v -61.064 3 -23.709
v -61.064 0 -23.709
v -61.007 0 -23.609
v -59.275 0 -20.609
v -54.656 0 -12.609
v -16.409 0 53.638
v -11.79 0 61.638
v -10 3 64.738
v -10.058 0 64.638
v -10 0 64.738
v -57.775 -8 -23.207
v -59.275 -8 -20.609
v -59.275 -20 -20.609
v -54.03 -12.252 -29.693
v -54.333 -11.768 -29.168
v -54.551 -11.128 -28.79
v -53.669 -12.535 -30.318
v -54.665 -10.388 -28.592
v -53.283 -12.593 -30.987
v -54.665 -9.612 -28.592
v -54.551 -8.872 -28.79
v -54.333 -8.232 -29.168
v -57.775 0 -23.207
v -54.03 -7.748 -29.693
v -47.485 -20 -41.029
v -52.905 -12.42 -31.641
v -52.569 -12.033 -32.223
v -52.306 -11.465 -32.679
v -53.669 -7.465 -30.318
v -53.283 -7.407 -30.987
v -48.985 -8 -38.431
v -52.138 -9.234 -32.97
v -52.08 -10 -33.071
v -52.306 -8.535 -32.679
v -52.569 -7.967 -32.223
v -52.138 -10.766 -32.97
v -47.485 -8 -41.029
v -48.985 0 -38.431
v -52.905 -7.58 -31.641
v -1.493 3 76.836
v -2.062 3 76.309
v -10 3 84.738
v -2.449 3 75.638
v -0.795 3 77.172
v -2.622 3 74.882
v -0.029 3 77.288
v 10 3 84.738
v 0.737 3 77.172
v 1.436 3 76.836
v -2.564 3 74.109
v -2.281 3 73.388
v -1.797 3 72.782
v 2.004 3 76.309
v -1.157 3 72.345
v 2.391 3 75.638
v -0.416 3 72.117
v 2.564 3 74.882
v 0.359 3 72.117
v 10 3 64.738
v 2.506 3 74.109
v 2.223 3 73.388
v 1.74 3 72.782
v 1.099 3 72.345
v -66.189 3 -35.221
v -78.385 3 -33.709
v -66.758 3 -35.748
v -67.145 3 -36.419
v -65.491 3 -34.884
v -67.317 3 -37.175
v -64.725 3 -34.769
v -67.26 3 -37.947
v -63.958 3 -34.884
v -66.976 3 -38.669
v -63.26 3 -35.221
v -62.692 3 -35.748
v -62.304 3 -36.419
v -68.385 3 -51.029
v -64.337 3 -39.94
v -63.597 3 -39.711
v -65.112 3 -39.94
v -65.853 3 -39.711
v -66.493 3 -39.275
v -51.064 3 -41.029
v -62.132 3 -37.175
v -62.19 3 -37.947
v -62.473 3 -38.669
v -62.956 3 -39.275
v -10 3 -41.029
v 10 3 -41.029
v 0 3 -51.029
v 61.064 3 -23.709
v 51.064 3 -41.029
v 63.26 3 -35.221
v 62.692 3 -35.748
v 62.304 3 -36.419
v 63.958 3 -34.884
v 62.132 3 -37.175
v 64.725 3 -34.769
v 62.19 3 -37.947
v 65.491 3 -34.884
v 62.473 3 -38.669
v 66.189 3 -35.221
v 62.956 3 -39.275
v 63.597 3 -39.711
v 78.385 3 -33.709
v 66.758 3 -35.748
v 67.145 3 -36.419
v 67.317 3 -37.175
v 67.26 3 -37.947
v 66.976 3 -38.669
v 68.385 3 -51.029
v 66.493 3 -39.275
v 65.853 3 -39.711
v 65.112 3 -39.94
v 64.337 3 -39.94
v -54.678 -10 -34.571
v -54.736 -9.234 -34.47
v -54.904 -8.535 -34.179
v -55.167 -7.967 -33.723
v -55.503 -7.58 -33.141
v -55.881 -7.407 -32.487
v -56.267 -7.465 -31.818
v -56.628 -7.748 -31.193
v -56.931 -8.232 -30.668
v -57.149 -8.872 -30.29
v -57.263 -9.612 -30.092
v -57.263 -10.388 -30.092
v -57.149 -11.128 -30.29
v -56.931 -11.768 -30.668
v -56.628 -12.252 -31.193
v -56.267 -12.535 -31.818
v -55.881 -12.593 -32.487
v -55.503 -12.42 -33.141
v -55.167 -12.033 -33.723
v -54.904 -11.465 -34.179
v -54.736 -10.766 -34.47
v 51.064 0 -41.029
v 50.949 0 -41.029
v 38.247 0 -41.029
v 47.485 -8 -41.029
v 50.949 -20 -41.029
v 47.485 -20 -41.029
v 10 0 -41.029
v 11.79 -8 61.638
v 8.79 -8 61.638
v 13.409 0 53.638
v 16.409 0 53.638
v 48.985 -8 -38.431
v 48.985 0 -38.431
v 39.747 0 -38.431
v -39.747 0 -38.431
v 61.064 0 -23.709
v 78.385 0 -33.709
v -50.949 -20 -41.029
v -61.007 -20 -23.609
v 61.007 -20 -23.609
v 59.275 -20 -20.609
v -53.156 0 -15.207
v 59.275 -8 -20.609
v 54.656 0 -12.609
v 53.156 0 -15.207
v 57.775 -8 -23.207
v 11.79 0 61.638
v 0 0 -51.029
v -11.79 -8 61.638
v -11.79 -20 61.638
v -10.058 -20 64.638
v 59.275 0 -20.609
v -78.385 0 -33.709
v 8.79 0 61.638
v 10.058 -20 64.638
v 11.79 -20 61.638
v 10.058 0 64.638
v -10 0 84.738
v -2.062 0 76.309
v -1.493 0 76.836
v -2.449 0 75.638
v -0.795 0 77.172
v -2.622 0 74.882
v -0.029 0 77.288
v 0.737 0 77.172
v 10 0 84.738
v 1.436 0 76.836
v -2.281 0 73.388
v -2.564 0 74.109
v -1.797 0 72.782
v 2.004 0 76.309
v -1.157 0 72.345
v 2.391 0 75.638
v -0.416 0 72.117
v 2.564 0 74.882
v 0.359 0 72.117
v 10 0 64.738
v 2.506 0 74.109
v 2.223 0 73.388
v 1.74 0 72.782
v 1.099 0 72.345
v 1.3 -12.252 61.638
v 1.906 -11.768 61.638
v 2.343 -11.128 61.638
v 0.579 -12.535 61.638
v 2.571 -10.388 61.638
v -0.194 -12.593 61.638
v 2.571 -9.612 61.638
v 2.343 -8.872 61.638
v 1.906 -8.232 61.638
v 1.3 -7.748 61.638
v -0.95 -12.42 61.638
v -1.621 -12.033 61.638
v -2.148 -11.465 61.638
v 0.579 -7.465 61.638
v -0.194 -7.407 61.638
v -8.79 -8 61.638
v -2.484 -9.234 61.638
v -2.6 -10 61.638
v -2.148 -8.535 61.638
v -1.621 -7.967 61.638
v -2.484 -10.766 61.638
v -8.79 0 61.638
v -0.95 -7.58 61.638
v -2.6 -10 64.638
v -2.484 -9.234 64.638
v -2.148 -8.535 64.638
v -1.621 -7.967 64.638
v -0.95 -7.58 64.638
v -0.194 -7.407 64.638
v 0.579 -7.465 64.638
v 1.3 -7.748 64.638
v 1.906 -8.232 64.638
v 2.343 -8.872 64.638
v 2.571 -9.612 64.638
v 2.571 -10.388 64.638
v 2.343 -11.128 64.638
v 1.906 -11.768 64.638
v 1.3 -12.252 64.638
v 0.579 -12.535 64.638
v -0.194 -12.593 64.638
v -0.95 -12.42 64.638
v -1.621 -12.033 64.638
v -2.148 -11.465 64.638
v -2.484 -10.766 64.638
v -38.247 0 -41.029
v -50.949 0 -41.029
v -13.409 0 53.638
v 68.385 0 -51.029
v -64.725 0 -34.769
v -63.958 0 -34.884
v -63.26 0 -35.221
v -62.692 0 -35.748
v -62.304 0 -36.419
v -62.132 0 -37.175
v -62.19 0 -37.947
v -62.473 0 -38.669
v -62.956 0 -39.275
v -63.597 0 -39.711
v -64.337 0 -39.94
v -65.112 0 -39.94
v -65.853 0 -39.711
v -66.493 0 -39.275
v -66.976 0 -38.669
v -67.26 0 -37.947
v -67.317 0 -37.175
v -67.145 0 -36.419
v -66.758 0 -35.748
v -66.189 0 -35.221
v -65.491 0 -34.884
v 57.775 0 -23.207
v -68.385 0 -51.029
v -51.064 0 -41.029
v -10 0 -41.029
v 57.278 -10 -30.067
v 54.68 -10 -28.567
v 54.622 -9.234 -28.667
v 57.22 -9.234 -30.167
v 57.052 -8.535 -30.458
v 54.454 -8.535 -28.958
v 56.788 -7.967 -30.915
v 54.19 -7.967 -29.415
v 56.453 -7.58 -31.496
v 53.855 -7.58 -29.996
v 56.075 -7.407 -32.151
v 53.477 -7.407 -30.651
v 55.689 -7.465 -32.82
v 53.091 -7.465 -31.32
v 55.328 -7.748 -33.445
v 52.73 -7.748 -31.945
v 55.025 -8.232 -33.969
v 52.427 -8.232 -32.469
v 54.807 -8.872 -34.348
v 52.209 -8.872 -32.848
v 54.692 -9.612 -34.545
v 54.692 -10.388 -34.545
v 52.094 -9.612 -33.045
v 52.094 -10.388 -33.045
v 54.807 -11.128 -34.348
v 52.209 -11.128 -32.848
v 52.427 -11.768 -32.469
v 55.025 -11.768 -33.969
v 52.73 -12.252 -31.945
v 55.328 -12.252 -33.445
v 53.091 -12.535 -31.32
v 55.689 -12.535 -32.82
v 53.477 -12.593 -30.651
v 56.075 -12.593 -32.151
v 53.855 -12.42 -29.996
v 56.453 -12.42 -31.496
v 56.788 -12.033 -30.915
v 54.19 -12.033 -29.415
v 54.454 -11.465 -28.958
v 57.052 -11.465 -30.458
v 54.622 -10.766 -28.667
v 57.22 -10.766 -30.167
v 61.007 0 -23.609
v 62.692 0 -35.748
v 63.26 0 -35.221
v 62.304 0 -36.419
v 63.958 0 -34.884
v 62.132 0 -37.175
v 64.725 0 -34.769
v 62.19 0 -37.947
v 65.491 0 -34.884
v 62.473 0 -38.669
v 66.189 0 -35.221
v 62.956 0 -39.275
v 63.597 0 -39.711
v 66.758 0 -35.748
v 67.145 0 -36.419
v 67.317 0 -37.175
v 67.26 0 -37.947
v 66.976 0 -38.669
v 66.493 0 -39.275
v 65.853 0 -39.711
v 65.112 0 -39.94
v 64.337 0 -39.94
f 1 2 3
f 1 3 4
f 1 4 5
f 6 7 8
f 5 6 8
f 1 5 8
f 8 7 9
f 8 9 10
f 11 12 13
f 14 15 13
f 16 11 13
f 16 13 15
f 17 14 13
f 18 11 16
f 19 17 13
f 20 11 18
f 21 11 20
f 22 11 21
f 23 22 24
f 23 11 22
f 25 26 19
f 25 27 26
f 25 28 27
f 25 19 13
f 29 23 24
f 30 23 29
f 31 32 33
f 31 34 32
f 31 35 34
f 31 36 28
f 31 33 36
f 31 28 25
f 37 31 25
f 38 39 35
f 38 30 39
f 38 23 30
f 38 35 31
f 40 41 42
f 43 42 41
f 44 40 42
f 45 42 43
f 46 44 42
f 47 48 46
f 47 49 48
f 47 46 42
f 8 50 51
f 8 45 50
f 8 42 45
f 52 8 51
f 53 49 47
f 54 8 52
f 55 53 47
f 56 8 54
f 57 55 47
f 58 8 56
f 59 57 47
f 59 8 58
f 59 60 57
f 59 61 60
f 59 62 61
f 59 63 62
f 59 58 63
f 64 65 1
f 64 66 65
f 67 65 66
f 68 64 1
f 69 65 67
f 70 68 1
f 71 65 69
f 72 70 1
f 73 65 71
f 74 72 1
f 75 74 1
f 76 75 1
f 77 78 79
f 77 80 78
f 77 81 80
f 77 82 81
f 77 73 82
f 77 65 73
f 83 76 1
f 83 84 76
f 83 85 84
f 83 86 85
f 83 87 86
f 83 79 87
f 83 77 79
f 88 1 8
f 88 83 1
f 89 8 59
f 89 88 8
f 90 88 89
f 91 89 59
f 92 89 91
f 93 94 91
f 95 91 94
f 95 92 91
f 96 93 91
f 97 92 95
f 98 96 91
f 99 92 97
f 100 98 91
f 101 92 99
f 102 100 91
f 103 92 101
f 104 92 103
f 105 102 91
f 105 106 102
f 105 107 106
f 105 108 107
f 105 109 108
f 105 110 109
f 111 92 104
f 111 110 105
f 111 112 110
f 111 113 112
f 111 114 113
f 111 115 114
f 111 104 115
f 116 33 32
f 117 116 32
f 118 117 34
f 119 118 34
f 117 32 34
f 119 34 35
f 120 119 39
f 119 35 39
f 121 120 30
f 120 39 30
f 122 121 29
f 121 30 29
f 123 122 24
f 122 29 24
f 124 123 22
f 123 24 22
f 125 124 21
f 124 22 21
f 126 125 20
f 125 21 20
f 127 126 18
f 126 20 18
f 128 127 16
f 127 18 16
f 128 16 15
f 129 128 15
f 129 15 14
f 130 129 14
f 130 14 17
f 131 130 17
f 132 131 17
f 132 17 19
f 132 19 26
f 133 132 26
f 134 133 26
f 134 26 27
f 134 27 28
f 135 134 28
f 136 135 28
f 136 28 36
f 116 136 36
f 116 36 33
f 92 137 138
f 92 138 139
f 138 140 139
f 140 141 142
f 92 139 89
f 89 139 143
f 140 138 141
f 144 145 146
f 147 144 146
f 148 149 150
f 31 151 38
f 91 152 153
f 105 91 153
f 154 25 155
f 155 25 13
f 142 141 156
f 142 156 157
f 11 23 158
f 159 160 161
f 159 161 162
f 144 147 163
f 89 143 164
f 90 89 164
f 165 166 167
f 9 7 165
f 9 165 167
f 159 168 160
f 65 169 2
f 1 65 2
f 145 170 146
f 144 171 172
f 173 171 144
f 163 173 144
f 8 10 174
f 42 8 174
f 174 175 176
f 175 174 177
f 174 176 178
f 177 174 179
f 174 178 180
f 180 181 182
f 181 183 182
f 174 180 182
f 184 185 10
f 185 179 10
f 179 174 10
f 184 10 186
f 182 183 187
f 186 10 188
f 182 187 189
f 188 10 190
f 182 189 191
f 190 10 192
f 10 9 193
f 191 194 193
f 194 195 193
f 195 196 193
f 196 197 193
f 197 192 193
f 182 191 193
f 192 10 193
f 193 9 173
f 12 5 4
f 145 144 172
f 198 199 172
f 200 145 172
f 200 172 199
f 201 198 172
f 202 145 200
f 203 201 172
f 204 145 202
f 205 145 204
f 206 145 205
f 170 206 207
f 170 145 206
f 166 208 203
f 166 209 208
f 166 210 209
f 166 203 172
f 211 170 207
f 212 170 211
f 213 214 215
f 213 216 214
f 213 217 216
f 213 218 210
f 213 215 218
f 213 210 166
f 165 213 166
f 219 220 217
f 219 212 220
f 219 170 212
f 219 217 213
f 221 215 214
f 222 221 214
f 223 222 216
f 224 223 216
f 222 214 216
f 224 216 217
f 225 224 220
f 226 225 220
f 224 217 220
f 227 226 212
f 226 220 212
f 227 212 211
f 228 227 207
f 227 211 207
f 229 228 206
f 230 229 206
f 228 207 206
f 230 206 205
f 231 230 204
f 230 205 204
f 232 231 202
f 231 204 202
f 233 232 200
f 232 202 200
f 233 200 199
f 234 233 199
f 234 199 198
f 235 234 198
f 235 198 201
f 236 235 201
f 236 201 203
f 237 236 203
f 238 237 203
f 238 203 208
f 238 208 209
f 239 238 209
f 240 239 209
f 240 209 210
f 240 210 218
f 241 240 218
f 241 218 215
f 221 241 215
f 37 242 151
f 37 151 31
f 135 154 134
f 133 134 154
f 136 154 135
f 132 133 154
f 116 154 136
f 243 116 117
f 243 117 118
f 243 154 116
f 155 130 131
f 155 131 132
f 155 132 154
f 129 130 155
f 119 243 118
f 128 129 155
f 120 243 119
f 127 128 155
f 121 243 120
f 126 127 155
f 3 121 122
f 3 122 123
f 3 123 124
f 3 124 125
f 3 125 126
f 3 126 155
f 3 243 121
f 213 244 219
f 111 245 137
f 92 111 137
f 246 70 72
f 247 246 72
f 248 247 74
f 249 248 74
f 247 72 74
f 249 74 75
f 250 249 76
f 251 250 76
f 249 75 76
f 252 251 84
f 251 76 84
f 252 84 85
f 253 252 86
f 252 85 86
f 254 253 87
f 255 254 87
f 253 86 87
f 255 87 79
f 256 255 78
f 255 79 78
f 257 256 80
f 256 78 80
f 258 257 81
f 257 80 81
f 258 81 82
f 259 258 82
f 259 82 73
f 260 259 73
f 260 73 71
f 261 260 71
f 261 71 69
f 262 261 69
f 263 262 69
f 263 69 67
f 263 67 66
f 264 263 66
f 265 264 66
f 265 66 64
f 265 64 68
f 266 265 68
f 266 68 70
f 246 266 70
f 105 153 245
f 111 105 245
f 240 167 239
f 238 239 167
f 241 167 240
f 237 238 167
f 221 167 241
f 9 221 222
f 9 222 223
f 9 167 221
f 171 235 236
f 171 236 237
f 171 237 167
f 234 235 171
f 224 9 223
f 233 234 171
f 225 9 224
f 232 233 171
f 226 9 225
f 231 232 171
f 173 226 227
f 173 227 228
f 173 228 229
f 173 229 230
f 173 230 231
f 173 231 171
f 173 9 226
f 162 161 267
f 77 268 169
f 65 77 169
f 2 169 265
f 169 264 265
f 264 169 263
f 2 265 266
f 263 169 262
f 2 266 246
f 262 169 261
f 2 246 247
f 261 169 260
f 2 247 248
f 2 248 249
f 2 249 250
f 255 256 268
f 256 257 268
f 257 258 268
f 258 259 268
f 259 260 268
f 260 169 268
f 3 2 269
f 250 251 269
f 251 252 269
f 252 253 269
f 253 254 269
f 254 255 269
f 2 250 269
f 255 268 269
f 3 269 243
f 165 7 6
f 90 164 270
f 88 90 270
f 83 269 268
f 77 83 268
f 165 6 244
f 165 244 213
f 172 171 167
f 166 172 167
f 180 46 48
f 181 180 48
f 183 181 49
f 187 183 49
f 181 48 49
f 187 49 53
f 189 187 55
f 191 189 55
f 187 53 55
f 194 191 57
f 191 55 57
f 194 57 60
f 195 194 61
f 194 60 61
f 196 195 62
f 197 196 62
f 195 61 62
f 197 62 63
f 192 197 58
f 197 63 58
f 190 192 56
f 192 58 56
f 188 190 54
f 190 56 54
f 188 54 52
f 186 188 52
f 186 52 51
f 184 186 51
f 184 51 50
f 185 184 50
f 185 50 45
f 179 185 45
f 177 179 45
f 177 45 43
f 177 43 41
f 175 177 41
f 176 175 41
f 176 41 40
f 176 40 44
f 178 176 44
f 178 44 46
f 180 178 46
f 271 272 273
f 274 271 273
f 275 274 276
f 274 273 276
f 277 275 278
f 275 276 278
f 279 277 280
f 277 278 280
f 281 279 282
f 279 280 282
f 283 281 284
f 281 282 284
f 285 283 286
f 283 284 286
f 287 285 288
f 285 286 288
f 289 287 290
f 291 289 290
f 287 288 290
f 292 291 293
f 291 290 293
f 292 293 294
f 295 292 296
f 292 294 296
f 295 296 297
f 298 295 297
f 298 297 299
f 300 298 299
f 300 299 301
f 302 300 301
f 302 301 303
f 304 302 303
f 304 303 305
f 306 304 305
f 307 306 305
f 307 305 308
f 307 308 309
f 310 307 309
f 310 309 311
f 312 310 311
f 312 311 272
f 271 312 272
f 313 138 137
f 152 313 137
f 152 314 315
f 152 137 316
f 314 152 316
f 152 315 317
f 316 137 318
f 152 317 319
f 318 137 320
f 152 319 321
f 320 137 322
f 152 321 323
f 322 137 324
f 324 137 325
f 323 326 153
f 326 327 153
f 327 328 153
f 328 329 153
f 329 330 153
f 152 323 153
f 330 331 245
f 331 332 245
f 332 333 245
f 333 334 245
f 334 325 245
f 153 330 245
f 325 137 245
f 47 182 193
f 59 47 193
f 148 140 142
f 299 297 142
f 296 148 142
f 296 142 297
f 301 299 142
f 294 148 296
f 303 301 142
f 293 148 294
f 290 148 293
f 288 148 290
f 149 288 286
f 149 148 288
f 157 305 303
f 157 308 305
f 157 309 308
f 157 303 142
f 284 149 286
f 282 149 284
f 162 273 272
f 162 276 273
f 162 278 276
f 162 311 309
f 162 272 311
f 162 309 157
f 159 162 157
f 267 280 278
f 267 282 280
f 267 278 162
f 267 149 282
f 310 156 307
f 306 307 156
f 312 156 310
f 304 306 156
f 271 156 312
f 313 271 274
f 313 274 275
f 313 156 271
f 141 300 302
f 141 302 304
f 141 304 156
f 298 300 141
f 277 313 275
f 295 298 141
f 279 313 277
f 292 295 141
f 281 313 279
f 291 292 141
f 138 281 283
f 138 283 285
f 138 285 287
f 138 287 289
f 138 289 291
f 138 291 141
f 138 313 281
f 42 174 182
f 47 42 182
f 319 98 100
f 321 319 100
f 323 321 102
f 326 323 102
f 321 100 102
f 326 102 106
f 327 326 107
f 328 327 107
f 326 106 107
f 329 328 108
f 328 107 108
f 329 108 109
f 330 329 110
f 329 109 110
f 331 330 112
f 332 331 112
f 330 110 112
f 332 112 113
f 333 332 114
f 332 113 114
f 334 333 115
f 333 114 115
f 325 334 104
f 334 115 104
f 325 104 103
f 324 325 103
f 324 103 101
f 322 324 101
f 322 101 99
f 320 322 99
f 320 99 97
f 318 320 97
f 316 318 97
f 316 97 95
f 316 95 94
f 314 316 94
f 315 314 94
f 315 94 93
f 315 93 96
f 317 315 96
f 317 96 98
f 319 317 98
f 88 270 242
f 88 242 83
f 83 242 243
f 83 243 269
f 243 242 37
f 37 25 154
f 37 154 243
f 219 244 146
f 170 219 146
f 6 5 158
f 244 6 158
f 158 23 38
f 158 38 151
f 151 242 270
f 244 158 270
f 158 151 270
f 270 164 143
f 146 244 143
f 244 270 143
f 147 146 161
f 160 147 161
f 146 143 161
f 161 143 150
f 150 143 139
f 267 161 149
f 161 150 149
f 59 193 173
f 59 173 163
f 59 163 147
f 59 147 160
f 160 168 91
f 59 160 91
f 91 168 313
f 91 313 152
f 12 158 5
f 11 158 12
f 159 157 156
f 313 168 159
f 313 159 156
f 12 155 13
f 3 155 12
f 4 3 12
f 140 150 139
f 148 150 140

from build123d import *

# Parameters (mm, degrees)
AUFSATZ_LINEAR_AUSTRAGEN1_DEPTH = 3
AUFSATZ_LINEAR_AUSTRAGEN3_DEPTH = 3
AUFSATZ_LINEAR_AUSTRAGEN2_DEPTH = 20
AUFSATZ_LINEAR_AUSTRAGEN4_DEPTH = 8
FASE1_SIZE                      = 8
SCHNITT_LINEAR_AUSTRAGEN1_REACH = 119.702
SKIZZE5_R                       = 2.6
SCHNITT_LINEAR_AUSTRAGEN2_REACH = 178.395
SKIZZE6_R                       = 2.6
SCHNITT_LINEAR_AUSTRAGEN3_REACH = 178.395
SKIZZE7_R                       = 2.6
SCHNITT_LINEAR_AUSTRAGEN4_REACH = 140.701
SKIZZE8_R                       = 2.6


with BuildPart() as part:
    # Skizze1 → Aufsatz-Linear austragen1 (new body)
    with BuildSketch(Plane(origin=(0, 0, 0), x_dir=(1, 0, 0), z_dir=(0, 1, 0))):
        Polygon((-10, -84.737699009), (10, -84.737699009), (10, -64.737699009), (61.064491924, 23.708595467), (78.385, 33.708595467), (68.385, 51.029103542), (51.064491924, 41.029103542), (-51.064491924, 41.029103542), (-68.385, 51.029103542), (-78.385, 33.708595467), (-61.064491924, 23.708595467), (-10, -64.737699009), align=None)
    extrude(amount=AUFSATZ_LINEAR_AUSTRAGEN1_DEPTH)

    # Skizze3 → Aufsatz-Linear austragen3 (add)
    with BuildSketch(Plane.XZ):
        Polygon((0, -51.029103542), (-10, -41.029103542), (10, -41.029103542), align=None)
    extrude(amount=-AUFSATZ_LINEAR_AUSTRAGEN3_DEPTH)

    # Skizze2 → Aufsatz-Linear austragen2 (add)
    with BuildSketch(Plane.XZ):
        Polygon((-10.057735027, 64.637699009), (10.057735027, 64.637699009), (11.789785834, 61.637699009), (-11.789785834, 61.637699009), align=None)
        Polygon((61.006756897, -23.608595467), (50.94902187, -41.029103542), (47.484920255, -41.029103542), (59.27470609, -20.608595467), align=None)
        Polygon((-50.94902187, -41.029103542), (-61.006756897, -23.608595467), (-59.27470609, -20.608595467), (-47.484920255, -41.029103542), align=None)
    extrude(amount=AUFSATZ_LINEAR_AUSTRAGEN2_DEPTH)

    # Skizze4 → Aufsatz-Linear austragen4 (add)
    with BuildSketch(Plane.XZ):
        Polygon((-11.789785834, 61.637699009), (-16.408587988, 53.637699009), (-13.408587988, 53.637699009), (-8.789785834, 61.637699009), align=None)
        Polygon((11.789785834, 61.637699009), (8.789785834, 61.637699009), (13.408587988, 53.637699009), (16.408587988, 53.637699009), align=None)
        Polygon((59.27470609, -20.608595467), (54.655903936, -12.608595467), (53.155903936, -15.206671678), (57.77470609, -23.206671678), align=None)
        Polygon((47.484920255, -41.029103542), (48.984920255, -38.431027331), (39.747315948, -38.431027331), (38.247315948, -41.029103542), align=None)
        Polygon((-47.484920255, -41.029103542), (-38.247315948, -41.029103542), (-39.747315948, -38.431027331), (-48.984920255, -38.431027331), align=None)
        Polygon((-59.27470609, -20.608595467), (-57.77470609, -23.206671678), (-53.155903936, -15.206671678), (-54.655903936, -12.608595467), align=None)
    extrude(amount=AUFSATZ_LINEAR_AUSTRAGEN4_DEPTH)

    # Fase1
    # the kernel refuses this chamfer: 8 mm, written as the material it takes off along each edge
    with BuildSketch(Plane(origin=(-42.869171984, -8, -33.023814062), x_dir=(0.023812127644089447, 0.9996219169112968, 0.013747938305292782), z_dir=(-0.5000000000000003, 0, 0.8660254037844386))) as fase1_piece_1_section:
        Polygon((FASE1_SIZE * 0.999621916911, FASE1_SIZE * 0.0274958766106), (-FASE1_SIZE * 0.0274958766106, FASE1_SIZE * 0.999621916911), (0, 0), align=None)
    fase1_piece_1 = extrude(amount=44.146927807, mode=Mode.PRIVATE)
    fase1_piece_1 = split(fase1_piece_1, bisect_by=Plane(origin=(-56.186972779, 0, -15.224609283), z_dir=(0, -1, 0)), keep=Keep.TOP, mode=Mode.PRIVATE)
    add(fase1_piece_1, mode=Mode.SUBTRACT)
    with BuildSketch(Plane(origin=(-27.960583996, -8, -58.846245927), x_dir=(0.02381212764409005, 0.9996219169112968, 0.013747938305293118), z_dir=(-0.5, 0, 0.8660254037844387))) as fase1_piece_2_section:
        Polygon((FASE1_SIZE * 0.999621916911, FASE1_SIZE * 0.0274958766106), (-FASE1_SIZE * 0.0274958766106, FASE1_SIZE * 0.999621916911), (0, 0), align=None)
    fase1_piece_2 = extrude(amount=44.146927807, mode=Mode.PRIVATE)
    fase1_piece_2 = split(fase1_piece_2, bisect_by=Plane(origin=(-41.278384791, 0, -41.047041147), z_dir=(0, -1, 0)), keep=Keep.TOP, mode=Mode.PRIVATE)
    add(fase1_piece_2, mode=Mode.SUBTRACT)
    with BuildSketch(Plane(origin=(50.0340479, -8, -20.613884946), x_dir=(-0.023812127644090117, 0.9996219169112968, 0.013747938305293118), z_dir=(-0.49999999999999895, 0, -0.8660254037844393))) as fase1_piece_3_section:
        Polygon((FASE1_SIZE * 0.999621916911, FASE1_SIZE * 0.0274958766106), (-FASE1_SIZE * 0.0274958766106, FASE1_SIZE * 0.999621916911), (0, 0), align=None)
    fase1_piece_3 = extrude(amount=44.146927807, mode=Mode.PRIVATE)
    fase1_piece_3 = split(fase1_piece_3, bisect_by=Plane(origin=(41.278384791, 0, -41.047041147), z_dir=(0, -1, 0)), keep=Keep.TOP, mode=Mode.PRIVATE)
    add(fase1_piece_3, mode=Mode.SUBTRACT)
    with BuildSketch(Plane(origin=(64.942635888, -8, 5.208546918), x_dir=(-0.023812127644090537, 0.9996219169112968, 0.013747938305293455), z_dir=(-0.5000000000000016, 0, -0.8660254037844378))) as fase1_piece_4_section:
        Polygon((FASE1_SIZE * 0.999621916911, FASE1_SIZE * 0.0274958766106), (-FASE1_SIZE * 0.0274958766106, FASE1_SIZE * 0.999621916911), (0, 0), align=None)
    fase1_piece_4 = extrude(amount=44.146927807, mode=Mode.PRIVATE)
    fase1_piece_4 = split(fase1_piece_4, bisect_by=Plane(origin=(56.186972779, 0, -15.224609283), z_dir=(0, -1, 0)), keep=Keep.TOP, mode=Mode.PRIVATE)
    add(fase1_piece_4, mode=Mode.SUBTRACT)
    with BuildSketch(Plane(origin=(-7.164875916, -8, 53.637699009), x_dir=(0, -0.02749587661058627, 0.9996219169112968), z_dir=(1, 0, 0))) as fase1_piece_5_section:
        Polygon((FASE1_SIZE * 0.999621916911, -FASE1_SIZE * 0.0274958766106), (-FASE1_SIZE * 0.0274958766106, -FASE1_SIZE * 0.999621916911), (0, 0), align=None)
    fase1_piece_5 = extrude(amount=44.146927807, mode=Mode.PRIVATE)
    fase1_piece_5 = split(fase1_piece_5, bisect_by=Plane(origin=(14.908587988, 0, 61.735979971), z_dir=(0, -1, 0)), keep=Keep.TOP, mode=Mode.PRIVATE)
    add(fase1_piece_5, mode=Mode.SUBTRACT)
    with BuildSketch(Plane(origin=(-36.982051892, -8, 53.637699009), x_dir=(0, 0.9996219169112968, -0.027495876610586494), z_dir=(1, 0, 0))) as fase1_piece_6_section:
        Polygon((FASE1_SIZE * 0.999621916911, FASE1_SIZE * 0.0274958766106), (-FASE1_SIZE * 0.0274958766106, FASE1_SIZE * 0.999621916911), (0, 0), align=None)
    fase1_piece_6 = extrude(amount=44.146927807, mode=Mode.PRIVATE)
    fase1_piece_6 = split(fase1_piece_6, bisect_by=Plane(origin=(-14.908587988, 0, 56.27165043), z_dir=(0, -1, 0)), keep=Keep.TOP, mode=Mode.PRIVATE)
    add(fase1_piece_6, mode=Mode.SUBTRACT)

    # Skizze5 → Schnitt-Linear austragen1 (cut, up to next)
    with BuildSketch(Plane(origin=(0, 3, 0), x_dir=(1, 0, 0), z_dir=(0, 1, 0)), mode=Mode.PRIVATE) as schnitt_linear_austragen1_sk1:
        with Locations(Location((-64.724745962, 37.368849504, 0), (0, 0, 270))):
            Circle(SKIZZE5_R)
    schnitt_linear_austragen1_tool1 = extrude(schnitt_linear_austragen1_sk1.sketch, amount=-SCHNITT_LINEAR_AUSTRAGEN1_REACH, mode=Mode.PRIVATE) & part.part
    # Skizze5 → Schnitt-Linear austragen1 (cut, up to next)
    with BuildSketch(Plane(origin=(0, 3, 0), x_dir=(1, 0, 0), z_dir=(0, 1, 0)), mode=Mode.PRIVATE) as schnitt_linear_austragen1_sk2:
        with Locations(Location((64.724745962, 37.368849504, 0), (0, 0, 270))):
            Circle(SKIZZE5_R)
    schnitt_linear_austragen1_tool2 = extrude(schnitt_linear_austragen1_sk2.sketch, amount=-SCHNITT_LINEAR_AUSTRAGEN1_REACH, mode=Mode.PRIVATE) & part.part
    # Skizze5 → Schnitt-Linear austragen1 (cut, up to next)
    with BuildSketch(Plane(origin=(0, 3, 0), x_dir=(1, 0, 0), z_dir=(0, 1, 0)), mode=Mode.PRIVATE) as schnitt_linear_austragen1_sk3:
        with Locations(Location((-0.028867513, -74.687699009, 0), (0, 0, 270))):
            Circle(SKIZZE5_R)
    schnitt_linear_austragen1_tool3 = extrude(schnitt_linear_austragen1_sk3.sketch, amount=-SCHNITT_LINEAR_AUSTRAGEN1_REACH, mode=Mode.PRIVATE) & part.part
    add(schnitt_linear_austragen1_tool1.solids().sort_by_distance((-64.724746, 3, -37.36885))[0], mode=Mode.SUBTRACT)
    add(schnitt_linear_austragen1_tool2.solids().sort_by_distance((64.724746, 3, -37.36885))[0], mode=Mode.SUBTRACT)
    add(schnitt_linear_austragen1_tool3.solids().sort_by_distance((-0.028868, 3, 74.687699))[0], mode=Mode.SUBTRACT)

    # Skizze6 → Schnitt-Linear austragen2 (cut, up to next)
    with BuildSketch(Plane(origin=(53.379813173, 0, -30.818849504), x_dir=(0.49999999999999967, 0, 0.8660254037844389), z_dir=(-0.8660254037844389, 0, 0.49999999999999967)), mode=Mode.PRIVATE) as schnitt_linear_austragen2_sk1:
        with Locations((0, -10)):
            Circle(SKIZZE6_R)
    schnitt_linear_austragen2_tool1 = extrude(schnitt_linear_austragen2_sk1.sketch, amount=-SCHNITT_LINEAR_AUSTRAGEN2_REACH, mode=Mode.PRIVATE) & part.part
    add(schnitt_linear_austragen2_tool1.solids().sort_by_distance((53.379813, -10, -30.81885))[0], mode=Mode.SUBTRACT)

    # Skizze7 → Schnitt-Linear austragen3 (cut, up to next)
    with BuildSketch(Plane(origin=(-53.379813173, 0, -30.818849504), x_dir=(0.5000000000000007, 0, -0.8660254037844383), z_dir=(0.8660254037844383, 0, 0.5000000000000007)), mode=Mode.PRIVATE) as schnitt_linear_austragen3_sk1:
        with Locations((0, -10)):
            Circle(SKIZZE7_R)
    schnitt_linear_austragen3_tool1 = extrude(schnitt_linear_austragen3_sk1.sketch, amount=-SCHNITT_LINEAR_AUSTRAGEN3_REACH, mode=Mode.PRIVATE) & part.part
    add(schnitt_linear_austragen3_tool1.solids().sort_by_distance((-53.379813, -10, -30.81885))[0], mode=Mode.SUBTRACT)

    # Skizze8 → Schnitt-Linear austragen4 (cut, up to next)
    with BuildSketch(Plane(origin=(0, 0, 61.637699009), x_dir=(-1, 0, 0), z_dir=(0, 0, -1)), mode=Mode.PRIVATE) as schnitt_linear_austragen4_sk1:
        with Locations((0, -10)):
            Circle(SKIZZE8_R)
    schnitt_linear_austragen4_tool1 = extrude(schnitt_linear_austragen4_sk1.sketch, amount=-SCHNITT_LINEAR_AUSTRAGEN4_REACH, mode=Mode.PRIVATE) & part.part
    add(schnitt_linear_austragen4_tool1.solids().sort_by_distance((0, -10, 61.637699))[0], mode=Mode.SUBTRACT)


solid = part.part
